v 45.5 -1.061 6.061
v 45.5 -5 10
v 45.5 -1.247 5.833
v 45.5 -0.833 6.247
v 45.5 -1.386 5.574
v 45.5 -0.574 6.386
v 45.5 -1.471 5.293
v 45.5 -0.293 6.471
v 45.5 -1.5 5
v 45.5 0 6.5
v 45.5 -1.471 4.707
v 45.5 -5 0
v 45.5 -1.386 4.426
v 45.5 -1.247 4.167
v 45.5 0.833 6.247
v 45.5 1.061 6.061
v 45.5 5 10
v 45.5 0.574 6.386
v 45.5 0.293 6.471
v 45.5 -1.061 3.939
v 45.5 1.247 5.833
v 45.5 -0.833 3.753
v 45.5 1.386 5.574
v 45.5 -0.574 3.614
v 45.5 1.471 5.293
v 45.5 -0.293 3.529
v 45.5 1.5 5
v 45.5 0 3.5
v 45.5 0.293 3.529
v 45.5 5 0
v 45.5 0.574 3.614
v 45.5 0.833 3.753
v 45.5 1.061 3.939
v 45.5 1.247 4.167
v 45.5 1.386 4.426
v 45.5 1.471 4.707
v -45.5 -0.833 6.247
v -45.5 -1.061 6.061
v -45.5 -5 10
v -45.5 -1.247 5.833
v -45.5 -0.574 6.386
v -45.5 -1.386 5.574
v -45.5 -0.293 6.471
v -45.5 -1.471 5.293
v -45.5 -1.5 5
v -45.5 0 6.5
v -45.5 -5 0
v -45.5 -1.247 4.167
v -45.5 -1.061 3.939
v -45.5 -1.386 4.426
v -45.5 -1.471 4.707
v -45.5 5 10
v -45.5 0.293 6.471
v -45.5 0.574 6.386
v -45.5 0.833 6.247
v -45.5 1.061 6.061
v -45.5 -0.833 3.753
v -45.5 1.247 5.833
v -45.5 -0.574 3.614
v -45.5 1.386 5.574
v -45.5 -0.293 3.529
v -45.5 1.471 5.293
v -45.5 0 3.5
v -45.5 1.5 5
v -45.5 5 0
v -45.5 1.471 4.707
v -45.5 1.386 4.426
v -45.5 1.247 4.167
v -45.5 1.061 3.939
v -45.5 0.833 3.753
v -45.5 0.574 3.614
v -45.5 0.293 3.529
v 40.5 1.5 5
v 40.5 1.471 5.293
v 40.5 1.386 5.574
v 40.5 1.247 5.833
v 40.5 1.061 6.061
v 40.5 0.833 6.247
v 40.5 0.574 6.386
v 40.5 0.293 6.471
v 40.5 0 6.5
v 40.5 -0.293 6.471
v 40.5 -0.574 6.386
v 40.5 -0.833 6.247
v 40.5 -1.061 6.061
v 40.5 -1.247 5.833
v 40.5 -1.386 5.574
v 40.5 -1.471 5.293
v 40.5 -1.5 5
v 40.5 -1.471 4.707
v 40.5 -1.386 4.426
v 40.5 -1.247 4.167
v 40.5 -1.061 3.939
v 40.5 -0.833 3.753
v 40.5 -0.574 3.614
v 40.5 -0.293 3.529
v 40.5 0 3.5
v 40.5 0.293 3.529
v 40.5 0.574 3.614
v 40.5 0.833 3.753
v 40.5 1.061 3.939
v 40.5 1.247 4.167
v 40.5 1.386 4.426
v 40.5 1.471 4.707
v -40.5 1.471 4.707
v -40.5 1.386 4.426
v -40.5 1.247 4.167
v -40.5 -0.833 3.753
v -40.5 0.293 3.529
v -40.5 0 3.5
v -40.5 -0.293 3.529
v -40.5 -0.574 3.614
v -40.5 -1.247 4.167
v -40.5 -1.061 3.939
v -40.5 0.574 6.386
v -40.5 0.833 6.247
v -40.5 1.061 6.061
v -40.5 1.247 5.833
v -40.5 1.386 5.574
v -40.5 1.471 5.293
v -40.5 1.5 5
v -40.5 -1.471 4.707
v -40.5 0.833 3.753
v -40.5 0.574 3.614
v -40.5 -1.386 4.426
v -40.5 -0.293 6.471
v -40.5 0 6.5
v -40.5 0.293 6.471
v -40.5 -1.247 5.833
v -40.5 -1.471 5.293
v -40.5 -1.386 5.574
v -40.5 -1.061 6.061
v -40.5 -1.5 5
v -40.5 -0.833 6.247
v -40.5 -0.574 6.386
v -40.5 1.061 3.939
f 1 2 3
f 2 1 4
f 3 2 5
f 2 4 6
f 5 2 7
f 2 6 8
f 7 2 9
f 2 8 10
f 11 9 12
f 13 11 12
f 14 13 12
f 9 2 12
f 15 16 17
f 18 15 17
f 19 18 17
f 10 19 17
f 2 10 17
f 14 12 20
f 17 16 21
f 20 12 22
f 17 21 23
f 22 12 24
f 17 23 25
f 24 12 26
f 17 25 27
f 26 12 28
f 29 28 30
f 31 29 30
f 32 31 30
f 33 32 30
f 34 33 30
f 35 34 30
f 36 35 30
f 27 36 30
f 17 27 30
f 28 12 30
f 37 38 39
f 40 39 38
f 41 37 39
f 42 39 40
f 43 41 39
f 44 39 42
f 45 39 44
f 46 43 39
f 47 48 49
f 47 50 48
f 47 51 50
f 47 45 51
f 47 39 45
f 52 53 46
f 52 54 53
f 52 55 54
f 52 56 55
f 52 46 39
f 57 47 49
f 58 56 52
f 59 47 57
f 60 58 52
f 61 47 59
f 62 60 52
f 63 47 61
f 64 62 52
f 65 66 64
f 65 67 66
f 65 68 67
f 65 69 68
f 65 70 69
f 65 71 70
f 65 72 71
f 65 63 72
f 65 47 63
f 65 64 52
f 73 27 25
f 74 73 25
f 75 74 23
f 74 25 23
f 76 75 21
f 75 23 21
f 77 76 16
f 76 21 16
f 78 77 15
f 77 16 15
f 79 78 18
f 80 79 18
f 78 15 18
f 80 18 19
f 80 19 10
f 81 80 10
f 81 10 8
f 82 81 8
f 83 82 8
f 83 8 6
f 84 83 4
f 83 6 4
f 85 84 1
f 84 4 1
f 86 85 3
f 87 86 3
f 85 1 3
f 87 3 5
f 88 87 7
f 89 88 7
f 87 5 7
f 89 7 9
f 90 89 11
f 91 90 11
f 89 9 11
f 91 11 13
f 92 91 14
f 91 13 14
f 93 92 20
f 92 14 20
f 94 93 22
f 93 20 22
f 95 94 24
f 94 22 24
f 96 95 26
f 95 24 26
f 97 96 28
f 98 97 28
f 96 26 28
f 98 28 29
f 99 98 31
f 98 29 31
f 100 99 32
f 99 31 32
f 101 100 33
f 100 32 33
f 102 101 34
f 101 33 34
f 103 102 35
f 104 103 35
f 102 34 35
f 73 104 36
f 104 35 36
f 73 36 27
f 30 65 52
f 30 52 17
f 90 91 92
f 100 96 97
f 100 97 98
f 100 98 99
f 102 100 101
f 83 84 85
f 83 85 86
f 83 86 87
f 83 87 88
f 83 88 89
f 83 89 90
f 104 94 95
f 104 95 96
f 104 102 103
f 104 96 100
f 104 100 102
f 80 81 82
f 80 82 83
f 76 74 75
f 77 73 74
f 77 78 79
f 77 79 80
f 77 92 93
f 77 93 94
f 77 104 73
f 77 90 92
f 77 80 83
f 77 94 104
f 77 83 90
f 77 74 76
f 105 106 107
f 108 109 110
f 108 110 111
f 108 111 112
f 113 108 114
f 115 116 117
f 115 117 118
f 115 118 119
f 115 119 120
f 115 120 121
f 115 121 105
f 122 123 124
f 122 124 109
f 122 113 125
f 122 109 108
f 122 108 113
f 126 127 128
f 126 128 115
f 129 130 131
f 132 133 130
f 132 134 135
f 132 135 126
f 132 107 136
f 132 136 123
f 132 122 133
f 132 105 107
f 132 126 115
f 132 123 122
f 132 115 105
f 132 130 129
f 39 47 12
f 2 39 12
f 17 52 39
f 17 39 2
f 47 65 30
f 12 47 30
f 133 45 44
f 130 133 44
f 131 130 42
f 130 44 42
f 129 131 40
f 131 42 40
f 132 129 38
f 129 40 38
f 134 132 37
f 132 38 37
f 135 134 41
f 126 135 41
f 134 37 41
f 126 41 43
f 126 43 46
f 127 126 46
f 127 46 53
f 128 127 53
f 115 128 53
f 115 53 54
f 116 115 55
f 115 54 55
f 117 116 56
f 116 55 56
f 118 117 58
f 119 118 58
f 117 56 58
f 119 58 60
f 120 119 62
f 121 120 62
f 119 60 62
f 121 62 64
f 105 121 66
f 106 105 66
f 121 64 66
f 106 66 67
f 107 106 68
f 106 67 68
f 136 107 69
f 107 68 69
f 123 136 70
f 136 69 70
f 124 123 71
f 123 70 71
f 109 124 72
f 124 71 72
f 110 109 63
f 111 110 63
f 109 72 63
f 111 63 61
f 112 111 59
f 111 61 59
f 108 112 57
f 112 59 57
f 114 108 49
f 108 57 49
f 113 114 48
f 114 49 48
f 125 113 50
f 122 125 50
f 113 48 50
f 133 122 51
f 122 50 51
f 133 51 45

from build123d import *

# Parameters (mm, degrees)
SKETCH010_W     = 91
SKETCH010_H     = 10
PAD004_DEPTH    = 10
SKETCH011_R     = 1.5
POCKET006_DEPTH = 5
SKETCH012_R     = 1.5
POCKET007_DEPTH = 5


with BuildPart() as part:
    # Sketch010 → Pad004 (new body)
    with BuildSketch(Plane.XY):
        Rectangle(SKETCH010_W, SKETCH010_H)
    extrude(amount=PAD004_DEPTH)

    # Sketch011 (on Face1 of Pad004) → Pocket006 (cut)
    with BuildSketch(Plane(origin=(-45.5, 0, 0), x_dir=(0, -1, 0), z_dir=(-1, 0, 0))):
        with Locations((0, 5)):
            Circle(SKETCH011_R)
    extrude(amount=-POCKET006_DEPTH, mode=Mode.SUBTRACT)

    # Sketch012 (on Face7 of Pocket006) → Pocket007 (cut)
    with BuildSketch(Plane.YZ.offset(45.5)):
        with Locations((0, 5)):
            Circle(SKETCH012_R)
    extrude(amount=-POCKET007_DEPTH, mode=Mode.SUBTRACT)


solid = part.part
